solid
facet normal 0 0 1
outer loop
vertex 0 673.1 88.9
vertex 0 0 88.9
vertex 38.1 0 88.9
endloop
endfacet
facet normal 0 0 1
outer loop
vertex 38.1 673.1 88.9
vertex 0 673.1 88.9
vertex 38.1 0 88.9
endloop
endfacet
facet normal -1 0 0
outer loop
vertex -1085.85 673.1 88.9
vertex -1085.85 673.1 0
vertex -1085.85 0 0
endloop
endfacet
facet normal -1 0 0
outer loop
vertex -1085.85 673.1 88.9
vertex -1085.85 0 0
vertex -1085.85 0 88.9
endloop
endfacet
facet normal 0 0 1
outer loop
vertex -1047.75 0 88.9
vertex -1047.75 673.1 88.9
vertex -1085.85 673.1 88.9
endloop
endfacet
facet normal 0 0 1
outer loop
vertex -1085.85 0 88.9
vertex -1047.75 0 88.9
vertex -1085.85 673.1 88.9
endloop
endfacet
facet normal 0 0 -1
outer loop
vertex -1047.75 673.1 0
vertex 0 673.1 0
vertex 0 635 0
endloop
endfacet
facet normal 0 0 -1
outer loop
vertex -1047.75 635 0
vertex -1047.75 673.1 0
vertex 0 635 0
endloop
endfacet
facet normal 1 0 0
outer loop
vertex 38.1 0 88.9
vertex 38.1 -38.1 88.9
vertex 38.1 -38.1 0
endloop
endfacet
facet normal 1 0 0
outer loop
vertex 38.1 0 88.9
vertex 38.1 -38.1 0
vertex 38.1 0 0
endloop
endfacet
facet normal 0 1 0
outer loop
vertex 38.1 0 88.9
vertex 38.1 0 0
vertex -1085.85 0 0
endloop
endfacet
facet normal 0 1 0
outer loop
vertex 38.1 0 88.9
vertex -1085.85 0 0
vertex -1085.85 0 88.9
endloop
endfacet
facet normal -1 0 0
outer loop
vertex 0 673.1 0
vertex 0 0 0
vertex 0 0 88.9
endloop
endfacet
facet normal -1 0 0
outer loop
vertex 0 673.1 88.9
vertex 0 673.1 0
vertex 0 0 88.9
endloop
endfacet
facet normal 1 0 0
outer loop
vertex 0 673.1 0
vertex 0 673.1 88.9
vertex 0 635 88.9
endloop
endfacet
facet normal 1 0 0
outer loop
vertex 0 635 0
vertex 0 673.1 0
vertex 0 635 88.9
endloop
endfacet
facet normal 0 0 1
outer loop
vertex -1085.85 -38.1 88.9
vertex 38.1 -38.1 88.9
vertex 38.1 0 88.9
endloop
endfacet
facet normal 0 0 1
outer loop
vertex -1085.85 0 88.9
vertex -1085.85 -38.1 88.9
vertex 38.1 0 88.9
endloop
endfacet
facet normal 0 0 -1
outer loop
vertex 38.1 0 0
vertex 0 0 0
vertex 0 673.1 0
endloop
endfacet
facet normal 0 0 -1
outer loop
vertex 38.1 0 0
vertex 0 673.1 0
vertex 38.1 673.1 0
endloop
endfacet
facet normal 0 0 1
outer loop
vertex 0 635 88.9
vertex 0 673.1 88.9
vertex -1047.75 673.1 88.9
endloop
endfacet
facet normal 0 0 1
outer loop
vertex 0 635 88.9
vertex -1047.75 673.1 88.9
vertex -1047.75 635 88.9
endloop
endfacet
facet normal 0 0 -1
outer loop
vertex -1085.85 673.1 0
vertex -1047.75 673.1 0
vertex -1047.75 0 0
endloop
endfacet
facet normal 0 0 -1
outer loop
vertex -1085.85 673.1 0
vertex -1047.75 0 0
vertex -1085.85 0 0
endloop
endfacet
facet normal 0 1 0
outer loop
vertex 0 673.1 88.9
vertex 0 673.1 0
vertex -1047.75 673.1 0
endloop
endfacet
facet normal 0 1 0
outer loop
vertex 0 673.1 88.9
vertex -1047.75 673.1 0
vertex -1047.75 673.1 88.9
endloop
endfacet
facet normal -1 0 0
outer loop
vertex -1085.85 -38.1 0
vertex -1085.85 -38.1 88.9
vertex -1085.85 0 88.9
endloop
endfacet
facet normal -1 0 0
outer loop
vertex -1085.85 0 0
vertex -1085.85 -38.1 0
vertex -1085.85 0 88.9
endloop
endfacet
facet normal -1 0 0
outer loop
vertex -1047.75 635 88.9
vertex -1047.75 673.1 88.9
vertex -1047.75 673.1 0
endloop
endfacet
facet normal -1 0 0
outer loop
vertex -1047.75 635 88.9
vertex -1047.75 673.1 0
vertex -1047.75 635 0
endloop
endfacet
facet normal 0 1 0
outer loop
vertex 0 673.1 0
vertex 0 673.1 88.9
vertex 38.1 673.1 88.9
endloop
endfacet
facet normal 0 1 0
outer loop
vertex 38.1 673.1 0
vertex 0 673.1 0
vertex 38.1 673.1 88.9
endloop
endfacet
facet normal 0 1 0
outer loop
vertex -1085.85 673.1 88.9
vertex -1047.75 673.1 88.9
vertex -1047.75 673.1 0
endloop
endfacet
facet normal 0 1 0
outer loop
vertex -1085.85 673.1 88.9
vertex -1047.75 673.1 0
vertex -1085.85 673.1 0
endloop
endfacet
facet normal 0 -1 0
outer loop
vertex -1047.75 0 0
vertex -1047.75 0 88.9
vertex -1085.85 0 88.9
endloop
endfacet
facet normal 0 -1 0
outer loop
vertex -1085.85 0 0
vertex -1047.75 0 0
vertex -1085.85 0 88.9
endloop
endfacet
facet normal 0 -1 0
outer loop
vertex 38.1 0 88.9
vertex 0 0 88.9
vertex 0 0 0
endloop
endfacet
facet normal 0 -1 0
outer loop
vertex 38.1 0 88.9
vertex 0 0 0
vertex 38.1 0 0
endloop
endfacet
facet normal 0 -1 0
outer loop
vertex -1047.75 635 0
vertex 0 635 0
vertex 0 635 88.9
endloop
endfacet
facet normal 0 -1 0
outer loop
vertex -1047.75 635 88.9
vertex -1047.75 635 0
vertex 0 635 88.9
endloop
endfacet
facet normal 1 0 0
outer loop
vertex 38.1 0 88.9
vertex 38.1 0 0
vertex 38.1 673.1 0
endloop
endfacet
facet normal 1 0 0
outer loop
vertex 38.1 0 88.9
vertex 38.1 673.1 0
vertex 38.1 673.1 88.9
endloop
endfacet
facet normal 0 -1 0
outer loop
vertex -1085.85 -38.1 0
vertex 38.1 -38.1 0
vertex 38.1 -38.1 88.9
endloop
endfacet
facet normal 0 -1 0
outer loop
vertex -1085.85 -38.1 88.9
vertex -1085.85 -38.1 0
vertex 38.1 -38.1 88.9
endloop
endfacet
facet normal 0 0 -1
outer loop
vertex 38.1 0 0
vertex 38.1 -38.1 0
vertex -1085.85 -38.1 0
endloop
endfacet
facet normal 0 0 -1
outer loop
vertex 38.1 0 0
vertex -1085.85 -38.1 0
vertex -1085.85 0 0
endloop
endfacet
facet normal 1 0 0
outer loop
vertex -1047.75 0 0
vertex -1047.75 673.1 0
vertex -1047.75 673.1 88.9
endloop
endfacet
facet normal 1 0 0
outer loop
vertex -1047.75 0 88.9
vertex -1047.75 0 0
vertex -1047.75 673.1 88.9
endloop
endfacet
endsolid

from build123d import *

# Parameters (mm, degrees)
F0_W     = 38.1
F0_H     = 88.9
F1_DEPTH = 673.1
F2_W     = 38.1
F2_H     = 88.9
F3_DEPTH = 1047.75
F4_W     = 38.1
F4_H     = 88.9
F5_DEPTH = 673.1
F6_W     = 38.1
F6_H     = 88.9
F7_DEPTH = 1123.95


with BuildPart() as f1:
    # F0 (on Front) → F1 (new body)
    with BuildSketch(Plane.XZ):
        with Locations((19.05, 44.45)):
            Rectangle(F0_W, F0_H)
    extrude(amount=-F1_DEPTH)


with BuildPart() as f3:
    # F2 (on face) → F3 (new body)
    with BuildSketch(Plane(origin=(0, 0, 0), x_dir=(0, -1, 0), z_dir=(-1, 0, 0))):
        with Locations((-654.05, 44.45)):
            Rectangle(F2_W, F2_H)
    extrude(amount=F3_DEPTH)


with BuildPart() as f5:
    # F4 (on face) → F5 (new body, through all)
    with BuildSketch(Plane(origin=(0, 673.1, 0), x_dir=(-1, 0, 0), z_dir=(0, 1, 0))):
        with Locations((1066.8, 44.45)):
            Rectangle(F4_W, F4_H)
    extrude(amount=-F5_DEPTH)


with BuildPart() as f7:
    # F6 (on face) → F7 (new body, through all)
    with BuildSketch(Plane.YZ.offset(38.1)):
        with Locations((-19.05, 44.45)):
            Rectangle(F6_W, F6_H)
    extrude(amount=-F7_DEPTH)


solid = Compound([f1.part, f3.part, f5.part, f7.part])
